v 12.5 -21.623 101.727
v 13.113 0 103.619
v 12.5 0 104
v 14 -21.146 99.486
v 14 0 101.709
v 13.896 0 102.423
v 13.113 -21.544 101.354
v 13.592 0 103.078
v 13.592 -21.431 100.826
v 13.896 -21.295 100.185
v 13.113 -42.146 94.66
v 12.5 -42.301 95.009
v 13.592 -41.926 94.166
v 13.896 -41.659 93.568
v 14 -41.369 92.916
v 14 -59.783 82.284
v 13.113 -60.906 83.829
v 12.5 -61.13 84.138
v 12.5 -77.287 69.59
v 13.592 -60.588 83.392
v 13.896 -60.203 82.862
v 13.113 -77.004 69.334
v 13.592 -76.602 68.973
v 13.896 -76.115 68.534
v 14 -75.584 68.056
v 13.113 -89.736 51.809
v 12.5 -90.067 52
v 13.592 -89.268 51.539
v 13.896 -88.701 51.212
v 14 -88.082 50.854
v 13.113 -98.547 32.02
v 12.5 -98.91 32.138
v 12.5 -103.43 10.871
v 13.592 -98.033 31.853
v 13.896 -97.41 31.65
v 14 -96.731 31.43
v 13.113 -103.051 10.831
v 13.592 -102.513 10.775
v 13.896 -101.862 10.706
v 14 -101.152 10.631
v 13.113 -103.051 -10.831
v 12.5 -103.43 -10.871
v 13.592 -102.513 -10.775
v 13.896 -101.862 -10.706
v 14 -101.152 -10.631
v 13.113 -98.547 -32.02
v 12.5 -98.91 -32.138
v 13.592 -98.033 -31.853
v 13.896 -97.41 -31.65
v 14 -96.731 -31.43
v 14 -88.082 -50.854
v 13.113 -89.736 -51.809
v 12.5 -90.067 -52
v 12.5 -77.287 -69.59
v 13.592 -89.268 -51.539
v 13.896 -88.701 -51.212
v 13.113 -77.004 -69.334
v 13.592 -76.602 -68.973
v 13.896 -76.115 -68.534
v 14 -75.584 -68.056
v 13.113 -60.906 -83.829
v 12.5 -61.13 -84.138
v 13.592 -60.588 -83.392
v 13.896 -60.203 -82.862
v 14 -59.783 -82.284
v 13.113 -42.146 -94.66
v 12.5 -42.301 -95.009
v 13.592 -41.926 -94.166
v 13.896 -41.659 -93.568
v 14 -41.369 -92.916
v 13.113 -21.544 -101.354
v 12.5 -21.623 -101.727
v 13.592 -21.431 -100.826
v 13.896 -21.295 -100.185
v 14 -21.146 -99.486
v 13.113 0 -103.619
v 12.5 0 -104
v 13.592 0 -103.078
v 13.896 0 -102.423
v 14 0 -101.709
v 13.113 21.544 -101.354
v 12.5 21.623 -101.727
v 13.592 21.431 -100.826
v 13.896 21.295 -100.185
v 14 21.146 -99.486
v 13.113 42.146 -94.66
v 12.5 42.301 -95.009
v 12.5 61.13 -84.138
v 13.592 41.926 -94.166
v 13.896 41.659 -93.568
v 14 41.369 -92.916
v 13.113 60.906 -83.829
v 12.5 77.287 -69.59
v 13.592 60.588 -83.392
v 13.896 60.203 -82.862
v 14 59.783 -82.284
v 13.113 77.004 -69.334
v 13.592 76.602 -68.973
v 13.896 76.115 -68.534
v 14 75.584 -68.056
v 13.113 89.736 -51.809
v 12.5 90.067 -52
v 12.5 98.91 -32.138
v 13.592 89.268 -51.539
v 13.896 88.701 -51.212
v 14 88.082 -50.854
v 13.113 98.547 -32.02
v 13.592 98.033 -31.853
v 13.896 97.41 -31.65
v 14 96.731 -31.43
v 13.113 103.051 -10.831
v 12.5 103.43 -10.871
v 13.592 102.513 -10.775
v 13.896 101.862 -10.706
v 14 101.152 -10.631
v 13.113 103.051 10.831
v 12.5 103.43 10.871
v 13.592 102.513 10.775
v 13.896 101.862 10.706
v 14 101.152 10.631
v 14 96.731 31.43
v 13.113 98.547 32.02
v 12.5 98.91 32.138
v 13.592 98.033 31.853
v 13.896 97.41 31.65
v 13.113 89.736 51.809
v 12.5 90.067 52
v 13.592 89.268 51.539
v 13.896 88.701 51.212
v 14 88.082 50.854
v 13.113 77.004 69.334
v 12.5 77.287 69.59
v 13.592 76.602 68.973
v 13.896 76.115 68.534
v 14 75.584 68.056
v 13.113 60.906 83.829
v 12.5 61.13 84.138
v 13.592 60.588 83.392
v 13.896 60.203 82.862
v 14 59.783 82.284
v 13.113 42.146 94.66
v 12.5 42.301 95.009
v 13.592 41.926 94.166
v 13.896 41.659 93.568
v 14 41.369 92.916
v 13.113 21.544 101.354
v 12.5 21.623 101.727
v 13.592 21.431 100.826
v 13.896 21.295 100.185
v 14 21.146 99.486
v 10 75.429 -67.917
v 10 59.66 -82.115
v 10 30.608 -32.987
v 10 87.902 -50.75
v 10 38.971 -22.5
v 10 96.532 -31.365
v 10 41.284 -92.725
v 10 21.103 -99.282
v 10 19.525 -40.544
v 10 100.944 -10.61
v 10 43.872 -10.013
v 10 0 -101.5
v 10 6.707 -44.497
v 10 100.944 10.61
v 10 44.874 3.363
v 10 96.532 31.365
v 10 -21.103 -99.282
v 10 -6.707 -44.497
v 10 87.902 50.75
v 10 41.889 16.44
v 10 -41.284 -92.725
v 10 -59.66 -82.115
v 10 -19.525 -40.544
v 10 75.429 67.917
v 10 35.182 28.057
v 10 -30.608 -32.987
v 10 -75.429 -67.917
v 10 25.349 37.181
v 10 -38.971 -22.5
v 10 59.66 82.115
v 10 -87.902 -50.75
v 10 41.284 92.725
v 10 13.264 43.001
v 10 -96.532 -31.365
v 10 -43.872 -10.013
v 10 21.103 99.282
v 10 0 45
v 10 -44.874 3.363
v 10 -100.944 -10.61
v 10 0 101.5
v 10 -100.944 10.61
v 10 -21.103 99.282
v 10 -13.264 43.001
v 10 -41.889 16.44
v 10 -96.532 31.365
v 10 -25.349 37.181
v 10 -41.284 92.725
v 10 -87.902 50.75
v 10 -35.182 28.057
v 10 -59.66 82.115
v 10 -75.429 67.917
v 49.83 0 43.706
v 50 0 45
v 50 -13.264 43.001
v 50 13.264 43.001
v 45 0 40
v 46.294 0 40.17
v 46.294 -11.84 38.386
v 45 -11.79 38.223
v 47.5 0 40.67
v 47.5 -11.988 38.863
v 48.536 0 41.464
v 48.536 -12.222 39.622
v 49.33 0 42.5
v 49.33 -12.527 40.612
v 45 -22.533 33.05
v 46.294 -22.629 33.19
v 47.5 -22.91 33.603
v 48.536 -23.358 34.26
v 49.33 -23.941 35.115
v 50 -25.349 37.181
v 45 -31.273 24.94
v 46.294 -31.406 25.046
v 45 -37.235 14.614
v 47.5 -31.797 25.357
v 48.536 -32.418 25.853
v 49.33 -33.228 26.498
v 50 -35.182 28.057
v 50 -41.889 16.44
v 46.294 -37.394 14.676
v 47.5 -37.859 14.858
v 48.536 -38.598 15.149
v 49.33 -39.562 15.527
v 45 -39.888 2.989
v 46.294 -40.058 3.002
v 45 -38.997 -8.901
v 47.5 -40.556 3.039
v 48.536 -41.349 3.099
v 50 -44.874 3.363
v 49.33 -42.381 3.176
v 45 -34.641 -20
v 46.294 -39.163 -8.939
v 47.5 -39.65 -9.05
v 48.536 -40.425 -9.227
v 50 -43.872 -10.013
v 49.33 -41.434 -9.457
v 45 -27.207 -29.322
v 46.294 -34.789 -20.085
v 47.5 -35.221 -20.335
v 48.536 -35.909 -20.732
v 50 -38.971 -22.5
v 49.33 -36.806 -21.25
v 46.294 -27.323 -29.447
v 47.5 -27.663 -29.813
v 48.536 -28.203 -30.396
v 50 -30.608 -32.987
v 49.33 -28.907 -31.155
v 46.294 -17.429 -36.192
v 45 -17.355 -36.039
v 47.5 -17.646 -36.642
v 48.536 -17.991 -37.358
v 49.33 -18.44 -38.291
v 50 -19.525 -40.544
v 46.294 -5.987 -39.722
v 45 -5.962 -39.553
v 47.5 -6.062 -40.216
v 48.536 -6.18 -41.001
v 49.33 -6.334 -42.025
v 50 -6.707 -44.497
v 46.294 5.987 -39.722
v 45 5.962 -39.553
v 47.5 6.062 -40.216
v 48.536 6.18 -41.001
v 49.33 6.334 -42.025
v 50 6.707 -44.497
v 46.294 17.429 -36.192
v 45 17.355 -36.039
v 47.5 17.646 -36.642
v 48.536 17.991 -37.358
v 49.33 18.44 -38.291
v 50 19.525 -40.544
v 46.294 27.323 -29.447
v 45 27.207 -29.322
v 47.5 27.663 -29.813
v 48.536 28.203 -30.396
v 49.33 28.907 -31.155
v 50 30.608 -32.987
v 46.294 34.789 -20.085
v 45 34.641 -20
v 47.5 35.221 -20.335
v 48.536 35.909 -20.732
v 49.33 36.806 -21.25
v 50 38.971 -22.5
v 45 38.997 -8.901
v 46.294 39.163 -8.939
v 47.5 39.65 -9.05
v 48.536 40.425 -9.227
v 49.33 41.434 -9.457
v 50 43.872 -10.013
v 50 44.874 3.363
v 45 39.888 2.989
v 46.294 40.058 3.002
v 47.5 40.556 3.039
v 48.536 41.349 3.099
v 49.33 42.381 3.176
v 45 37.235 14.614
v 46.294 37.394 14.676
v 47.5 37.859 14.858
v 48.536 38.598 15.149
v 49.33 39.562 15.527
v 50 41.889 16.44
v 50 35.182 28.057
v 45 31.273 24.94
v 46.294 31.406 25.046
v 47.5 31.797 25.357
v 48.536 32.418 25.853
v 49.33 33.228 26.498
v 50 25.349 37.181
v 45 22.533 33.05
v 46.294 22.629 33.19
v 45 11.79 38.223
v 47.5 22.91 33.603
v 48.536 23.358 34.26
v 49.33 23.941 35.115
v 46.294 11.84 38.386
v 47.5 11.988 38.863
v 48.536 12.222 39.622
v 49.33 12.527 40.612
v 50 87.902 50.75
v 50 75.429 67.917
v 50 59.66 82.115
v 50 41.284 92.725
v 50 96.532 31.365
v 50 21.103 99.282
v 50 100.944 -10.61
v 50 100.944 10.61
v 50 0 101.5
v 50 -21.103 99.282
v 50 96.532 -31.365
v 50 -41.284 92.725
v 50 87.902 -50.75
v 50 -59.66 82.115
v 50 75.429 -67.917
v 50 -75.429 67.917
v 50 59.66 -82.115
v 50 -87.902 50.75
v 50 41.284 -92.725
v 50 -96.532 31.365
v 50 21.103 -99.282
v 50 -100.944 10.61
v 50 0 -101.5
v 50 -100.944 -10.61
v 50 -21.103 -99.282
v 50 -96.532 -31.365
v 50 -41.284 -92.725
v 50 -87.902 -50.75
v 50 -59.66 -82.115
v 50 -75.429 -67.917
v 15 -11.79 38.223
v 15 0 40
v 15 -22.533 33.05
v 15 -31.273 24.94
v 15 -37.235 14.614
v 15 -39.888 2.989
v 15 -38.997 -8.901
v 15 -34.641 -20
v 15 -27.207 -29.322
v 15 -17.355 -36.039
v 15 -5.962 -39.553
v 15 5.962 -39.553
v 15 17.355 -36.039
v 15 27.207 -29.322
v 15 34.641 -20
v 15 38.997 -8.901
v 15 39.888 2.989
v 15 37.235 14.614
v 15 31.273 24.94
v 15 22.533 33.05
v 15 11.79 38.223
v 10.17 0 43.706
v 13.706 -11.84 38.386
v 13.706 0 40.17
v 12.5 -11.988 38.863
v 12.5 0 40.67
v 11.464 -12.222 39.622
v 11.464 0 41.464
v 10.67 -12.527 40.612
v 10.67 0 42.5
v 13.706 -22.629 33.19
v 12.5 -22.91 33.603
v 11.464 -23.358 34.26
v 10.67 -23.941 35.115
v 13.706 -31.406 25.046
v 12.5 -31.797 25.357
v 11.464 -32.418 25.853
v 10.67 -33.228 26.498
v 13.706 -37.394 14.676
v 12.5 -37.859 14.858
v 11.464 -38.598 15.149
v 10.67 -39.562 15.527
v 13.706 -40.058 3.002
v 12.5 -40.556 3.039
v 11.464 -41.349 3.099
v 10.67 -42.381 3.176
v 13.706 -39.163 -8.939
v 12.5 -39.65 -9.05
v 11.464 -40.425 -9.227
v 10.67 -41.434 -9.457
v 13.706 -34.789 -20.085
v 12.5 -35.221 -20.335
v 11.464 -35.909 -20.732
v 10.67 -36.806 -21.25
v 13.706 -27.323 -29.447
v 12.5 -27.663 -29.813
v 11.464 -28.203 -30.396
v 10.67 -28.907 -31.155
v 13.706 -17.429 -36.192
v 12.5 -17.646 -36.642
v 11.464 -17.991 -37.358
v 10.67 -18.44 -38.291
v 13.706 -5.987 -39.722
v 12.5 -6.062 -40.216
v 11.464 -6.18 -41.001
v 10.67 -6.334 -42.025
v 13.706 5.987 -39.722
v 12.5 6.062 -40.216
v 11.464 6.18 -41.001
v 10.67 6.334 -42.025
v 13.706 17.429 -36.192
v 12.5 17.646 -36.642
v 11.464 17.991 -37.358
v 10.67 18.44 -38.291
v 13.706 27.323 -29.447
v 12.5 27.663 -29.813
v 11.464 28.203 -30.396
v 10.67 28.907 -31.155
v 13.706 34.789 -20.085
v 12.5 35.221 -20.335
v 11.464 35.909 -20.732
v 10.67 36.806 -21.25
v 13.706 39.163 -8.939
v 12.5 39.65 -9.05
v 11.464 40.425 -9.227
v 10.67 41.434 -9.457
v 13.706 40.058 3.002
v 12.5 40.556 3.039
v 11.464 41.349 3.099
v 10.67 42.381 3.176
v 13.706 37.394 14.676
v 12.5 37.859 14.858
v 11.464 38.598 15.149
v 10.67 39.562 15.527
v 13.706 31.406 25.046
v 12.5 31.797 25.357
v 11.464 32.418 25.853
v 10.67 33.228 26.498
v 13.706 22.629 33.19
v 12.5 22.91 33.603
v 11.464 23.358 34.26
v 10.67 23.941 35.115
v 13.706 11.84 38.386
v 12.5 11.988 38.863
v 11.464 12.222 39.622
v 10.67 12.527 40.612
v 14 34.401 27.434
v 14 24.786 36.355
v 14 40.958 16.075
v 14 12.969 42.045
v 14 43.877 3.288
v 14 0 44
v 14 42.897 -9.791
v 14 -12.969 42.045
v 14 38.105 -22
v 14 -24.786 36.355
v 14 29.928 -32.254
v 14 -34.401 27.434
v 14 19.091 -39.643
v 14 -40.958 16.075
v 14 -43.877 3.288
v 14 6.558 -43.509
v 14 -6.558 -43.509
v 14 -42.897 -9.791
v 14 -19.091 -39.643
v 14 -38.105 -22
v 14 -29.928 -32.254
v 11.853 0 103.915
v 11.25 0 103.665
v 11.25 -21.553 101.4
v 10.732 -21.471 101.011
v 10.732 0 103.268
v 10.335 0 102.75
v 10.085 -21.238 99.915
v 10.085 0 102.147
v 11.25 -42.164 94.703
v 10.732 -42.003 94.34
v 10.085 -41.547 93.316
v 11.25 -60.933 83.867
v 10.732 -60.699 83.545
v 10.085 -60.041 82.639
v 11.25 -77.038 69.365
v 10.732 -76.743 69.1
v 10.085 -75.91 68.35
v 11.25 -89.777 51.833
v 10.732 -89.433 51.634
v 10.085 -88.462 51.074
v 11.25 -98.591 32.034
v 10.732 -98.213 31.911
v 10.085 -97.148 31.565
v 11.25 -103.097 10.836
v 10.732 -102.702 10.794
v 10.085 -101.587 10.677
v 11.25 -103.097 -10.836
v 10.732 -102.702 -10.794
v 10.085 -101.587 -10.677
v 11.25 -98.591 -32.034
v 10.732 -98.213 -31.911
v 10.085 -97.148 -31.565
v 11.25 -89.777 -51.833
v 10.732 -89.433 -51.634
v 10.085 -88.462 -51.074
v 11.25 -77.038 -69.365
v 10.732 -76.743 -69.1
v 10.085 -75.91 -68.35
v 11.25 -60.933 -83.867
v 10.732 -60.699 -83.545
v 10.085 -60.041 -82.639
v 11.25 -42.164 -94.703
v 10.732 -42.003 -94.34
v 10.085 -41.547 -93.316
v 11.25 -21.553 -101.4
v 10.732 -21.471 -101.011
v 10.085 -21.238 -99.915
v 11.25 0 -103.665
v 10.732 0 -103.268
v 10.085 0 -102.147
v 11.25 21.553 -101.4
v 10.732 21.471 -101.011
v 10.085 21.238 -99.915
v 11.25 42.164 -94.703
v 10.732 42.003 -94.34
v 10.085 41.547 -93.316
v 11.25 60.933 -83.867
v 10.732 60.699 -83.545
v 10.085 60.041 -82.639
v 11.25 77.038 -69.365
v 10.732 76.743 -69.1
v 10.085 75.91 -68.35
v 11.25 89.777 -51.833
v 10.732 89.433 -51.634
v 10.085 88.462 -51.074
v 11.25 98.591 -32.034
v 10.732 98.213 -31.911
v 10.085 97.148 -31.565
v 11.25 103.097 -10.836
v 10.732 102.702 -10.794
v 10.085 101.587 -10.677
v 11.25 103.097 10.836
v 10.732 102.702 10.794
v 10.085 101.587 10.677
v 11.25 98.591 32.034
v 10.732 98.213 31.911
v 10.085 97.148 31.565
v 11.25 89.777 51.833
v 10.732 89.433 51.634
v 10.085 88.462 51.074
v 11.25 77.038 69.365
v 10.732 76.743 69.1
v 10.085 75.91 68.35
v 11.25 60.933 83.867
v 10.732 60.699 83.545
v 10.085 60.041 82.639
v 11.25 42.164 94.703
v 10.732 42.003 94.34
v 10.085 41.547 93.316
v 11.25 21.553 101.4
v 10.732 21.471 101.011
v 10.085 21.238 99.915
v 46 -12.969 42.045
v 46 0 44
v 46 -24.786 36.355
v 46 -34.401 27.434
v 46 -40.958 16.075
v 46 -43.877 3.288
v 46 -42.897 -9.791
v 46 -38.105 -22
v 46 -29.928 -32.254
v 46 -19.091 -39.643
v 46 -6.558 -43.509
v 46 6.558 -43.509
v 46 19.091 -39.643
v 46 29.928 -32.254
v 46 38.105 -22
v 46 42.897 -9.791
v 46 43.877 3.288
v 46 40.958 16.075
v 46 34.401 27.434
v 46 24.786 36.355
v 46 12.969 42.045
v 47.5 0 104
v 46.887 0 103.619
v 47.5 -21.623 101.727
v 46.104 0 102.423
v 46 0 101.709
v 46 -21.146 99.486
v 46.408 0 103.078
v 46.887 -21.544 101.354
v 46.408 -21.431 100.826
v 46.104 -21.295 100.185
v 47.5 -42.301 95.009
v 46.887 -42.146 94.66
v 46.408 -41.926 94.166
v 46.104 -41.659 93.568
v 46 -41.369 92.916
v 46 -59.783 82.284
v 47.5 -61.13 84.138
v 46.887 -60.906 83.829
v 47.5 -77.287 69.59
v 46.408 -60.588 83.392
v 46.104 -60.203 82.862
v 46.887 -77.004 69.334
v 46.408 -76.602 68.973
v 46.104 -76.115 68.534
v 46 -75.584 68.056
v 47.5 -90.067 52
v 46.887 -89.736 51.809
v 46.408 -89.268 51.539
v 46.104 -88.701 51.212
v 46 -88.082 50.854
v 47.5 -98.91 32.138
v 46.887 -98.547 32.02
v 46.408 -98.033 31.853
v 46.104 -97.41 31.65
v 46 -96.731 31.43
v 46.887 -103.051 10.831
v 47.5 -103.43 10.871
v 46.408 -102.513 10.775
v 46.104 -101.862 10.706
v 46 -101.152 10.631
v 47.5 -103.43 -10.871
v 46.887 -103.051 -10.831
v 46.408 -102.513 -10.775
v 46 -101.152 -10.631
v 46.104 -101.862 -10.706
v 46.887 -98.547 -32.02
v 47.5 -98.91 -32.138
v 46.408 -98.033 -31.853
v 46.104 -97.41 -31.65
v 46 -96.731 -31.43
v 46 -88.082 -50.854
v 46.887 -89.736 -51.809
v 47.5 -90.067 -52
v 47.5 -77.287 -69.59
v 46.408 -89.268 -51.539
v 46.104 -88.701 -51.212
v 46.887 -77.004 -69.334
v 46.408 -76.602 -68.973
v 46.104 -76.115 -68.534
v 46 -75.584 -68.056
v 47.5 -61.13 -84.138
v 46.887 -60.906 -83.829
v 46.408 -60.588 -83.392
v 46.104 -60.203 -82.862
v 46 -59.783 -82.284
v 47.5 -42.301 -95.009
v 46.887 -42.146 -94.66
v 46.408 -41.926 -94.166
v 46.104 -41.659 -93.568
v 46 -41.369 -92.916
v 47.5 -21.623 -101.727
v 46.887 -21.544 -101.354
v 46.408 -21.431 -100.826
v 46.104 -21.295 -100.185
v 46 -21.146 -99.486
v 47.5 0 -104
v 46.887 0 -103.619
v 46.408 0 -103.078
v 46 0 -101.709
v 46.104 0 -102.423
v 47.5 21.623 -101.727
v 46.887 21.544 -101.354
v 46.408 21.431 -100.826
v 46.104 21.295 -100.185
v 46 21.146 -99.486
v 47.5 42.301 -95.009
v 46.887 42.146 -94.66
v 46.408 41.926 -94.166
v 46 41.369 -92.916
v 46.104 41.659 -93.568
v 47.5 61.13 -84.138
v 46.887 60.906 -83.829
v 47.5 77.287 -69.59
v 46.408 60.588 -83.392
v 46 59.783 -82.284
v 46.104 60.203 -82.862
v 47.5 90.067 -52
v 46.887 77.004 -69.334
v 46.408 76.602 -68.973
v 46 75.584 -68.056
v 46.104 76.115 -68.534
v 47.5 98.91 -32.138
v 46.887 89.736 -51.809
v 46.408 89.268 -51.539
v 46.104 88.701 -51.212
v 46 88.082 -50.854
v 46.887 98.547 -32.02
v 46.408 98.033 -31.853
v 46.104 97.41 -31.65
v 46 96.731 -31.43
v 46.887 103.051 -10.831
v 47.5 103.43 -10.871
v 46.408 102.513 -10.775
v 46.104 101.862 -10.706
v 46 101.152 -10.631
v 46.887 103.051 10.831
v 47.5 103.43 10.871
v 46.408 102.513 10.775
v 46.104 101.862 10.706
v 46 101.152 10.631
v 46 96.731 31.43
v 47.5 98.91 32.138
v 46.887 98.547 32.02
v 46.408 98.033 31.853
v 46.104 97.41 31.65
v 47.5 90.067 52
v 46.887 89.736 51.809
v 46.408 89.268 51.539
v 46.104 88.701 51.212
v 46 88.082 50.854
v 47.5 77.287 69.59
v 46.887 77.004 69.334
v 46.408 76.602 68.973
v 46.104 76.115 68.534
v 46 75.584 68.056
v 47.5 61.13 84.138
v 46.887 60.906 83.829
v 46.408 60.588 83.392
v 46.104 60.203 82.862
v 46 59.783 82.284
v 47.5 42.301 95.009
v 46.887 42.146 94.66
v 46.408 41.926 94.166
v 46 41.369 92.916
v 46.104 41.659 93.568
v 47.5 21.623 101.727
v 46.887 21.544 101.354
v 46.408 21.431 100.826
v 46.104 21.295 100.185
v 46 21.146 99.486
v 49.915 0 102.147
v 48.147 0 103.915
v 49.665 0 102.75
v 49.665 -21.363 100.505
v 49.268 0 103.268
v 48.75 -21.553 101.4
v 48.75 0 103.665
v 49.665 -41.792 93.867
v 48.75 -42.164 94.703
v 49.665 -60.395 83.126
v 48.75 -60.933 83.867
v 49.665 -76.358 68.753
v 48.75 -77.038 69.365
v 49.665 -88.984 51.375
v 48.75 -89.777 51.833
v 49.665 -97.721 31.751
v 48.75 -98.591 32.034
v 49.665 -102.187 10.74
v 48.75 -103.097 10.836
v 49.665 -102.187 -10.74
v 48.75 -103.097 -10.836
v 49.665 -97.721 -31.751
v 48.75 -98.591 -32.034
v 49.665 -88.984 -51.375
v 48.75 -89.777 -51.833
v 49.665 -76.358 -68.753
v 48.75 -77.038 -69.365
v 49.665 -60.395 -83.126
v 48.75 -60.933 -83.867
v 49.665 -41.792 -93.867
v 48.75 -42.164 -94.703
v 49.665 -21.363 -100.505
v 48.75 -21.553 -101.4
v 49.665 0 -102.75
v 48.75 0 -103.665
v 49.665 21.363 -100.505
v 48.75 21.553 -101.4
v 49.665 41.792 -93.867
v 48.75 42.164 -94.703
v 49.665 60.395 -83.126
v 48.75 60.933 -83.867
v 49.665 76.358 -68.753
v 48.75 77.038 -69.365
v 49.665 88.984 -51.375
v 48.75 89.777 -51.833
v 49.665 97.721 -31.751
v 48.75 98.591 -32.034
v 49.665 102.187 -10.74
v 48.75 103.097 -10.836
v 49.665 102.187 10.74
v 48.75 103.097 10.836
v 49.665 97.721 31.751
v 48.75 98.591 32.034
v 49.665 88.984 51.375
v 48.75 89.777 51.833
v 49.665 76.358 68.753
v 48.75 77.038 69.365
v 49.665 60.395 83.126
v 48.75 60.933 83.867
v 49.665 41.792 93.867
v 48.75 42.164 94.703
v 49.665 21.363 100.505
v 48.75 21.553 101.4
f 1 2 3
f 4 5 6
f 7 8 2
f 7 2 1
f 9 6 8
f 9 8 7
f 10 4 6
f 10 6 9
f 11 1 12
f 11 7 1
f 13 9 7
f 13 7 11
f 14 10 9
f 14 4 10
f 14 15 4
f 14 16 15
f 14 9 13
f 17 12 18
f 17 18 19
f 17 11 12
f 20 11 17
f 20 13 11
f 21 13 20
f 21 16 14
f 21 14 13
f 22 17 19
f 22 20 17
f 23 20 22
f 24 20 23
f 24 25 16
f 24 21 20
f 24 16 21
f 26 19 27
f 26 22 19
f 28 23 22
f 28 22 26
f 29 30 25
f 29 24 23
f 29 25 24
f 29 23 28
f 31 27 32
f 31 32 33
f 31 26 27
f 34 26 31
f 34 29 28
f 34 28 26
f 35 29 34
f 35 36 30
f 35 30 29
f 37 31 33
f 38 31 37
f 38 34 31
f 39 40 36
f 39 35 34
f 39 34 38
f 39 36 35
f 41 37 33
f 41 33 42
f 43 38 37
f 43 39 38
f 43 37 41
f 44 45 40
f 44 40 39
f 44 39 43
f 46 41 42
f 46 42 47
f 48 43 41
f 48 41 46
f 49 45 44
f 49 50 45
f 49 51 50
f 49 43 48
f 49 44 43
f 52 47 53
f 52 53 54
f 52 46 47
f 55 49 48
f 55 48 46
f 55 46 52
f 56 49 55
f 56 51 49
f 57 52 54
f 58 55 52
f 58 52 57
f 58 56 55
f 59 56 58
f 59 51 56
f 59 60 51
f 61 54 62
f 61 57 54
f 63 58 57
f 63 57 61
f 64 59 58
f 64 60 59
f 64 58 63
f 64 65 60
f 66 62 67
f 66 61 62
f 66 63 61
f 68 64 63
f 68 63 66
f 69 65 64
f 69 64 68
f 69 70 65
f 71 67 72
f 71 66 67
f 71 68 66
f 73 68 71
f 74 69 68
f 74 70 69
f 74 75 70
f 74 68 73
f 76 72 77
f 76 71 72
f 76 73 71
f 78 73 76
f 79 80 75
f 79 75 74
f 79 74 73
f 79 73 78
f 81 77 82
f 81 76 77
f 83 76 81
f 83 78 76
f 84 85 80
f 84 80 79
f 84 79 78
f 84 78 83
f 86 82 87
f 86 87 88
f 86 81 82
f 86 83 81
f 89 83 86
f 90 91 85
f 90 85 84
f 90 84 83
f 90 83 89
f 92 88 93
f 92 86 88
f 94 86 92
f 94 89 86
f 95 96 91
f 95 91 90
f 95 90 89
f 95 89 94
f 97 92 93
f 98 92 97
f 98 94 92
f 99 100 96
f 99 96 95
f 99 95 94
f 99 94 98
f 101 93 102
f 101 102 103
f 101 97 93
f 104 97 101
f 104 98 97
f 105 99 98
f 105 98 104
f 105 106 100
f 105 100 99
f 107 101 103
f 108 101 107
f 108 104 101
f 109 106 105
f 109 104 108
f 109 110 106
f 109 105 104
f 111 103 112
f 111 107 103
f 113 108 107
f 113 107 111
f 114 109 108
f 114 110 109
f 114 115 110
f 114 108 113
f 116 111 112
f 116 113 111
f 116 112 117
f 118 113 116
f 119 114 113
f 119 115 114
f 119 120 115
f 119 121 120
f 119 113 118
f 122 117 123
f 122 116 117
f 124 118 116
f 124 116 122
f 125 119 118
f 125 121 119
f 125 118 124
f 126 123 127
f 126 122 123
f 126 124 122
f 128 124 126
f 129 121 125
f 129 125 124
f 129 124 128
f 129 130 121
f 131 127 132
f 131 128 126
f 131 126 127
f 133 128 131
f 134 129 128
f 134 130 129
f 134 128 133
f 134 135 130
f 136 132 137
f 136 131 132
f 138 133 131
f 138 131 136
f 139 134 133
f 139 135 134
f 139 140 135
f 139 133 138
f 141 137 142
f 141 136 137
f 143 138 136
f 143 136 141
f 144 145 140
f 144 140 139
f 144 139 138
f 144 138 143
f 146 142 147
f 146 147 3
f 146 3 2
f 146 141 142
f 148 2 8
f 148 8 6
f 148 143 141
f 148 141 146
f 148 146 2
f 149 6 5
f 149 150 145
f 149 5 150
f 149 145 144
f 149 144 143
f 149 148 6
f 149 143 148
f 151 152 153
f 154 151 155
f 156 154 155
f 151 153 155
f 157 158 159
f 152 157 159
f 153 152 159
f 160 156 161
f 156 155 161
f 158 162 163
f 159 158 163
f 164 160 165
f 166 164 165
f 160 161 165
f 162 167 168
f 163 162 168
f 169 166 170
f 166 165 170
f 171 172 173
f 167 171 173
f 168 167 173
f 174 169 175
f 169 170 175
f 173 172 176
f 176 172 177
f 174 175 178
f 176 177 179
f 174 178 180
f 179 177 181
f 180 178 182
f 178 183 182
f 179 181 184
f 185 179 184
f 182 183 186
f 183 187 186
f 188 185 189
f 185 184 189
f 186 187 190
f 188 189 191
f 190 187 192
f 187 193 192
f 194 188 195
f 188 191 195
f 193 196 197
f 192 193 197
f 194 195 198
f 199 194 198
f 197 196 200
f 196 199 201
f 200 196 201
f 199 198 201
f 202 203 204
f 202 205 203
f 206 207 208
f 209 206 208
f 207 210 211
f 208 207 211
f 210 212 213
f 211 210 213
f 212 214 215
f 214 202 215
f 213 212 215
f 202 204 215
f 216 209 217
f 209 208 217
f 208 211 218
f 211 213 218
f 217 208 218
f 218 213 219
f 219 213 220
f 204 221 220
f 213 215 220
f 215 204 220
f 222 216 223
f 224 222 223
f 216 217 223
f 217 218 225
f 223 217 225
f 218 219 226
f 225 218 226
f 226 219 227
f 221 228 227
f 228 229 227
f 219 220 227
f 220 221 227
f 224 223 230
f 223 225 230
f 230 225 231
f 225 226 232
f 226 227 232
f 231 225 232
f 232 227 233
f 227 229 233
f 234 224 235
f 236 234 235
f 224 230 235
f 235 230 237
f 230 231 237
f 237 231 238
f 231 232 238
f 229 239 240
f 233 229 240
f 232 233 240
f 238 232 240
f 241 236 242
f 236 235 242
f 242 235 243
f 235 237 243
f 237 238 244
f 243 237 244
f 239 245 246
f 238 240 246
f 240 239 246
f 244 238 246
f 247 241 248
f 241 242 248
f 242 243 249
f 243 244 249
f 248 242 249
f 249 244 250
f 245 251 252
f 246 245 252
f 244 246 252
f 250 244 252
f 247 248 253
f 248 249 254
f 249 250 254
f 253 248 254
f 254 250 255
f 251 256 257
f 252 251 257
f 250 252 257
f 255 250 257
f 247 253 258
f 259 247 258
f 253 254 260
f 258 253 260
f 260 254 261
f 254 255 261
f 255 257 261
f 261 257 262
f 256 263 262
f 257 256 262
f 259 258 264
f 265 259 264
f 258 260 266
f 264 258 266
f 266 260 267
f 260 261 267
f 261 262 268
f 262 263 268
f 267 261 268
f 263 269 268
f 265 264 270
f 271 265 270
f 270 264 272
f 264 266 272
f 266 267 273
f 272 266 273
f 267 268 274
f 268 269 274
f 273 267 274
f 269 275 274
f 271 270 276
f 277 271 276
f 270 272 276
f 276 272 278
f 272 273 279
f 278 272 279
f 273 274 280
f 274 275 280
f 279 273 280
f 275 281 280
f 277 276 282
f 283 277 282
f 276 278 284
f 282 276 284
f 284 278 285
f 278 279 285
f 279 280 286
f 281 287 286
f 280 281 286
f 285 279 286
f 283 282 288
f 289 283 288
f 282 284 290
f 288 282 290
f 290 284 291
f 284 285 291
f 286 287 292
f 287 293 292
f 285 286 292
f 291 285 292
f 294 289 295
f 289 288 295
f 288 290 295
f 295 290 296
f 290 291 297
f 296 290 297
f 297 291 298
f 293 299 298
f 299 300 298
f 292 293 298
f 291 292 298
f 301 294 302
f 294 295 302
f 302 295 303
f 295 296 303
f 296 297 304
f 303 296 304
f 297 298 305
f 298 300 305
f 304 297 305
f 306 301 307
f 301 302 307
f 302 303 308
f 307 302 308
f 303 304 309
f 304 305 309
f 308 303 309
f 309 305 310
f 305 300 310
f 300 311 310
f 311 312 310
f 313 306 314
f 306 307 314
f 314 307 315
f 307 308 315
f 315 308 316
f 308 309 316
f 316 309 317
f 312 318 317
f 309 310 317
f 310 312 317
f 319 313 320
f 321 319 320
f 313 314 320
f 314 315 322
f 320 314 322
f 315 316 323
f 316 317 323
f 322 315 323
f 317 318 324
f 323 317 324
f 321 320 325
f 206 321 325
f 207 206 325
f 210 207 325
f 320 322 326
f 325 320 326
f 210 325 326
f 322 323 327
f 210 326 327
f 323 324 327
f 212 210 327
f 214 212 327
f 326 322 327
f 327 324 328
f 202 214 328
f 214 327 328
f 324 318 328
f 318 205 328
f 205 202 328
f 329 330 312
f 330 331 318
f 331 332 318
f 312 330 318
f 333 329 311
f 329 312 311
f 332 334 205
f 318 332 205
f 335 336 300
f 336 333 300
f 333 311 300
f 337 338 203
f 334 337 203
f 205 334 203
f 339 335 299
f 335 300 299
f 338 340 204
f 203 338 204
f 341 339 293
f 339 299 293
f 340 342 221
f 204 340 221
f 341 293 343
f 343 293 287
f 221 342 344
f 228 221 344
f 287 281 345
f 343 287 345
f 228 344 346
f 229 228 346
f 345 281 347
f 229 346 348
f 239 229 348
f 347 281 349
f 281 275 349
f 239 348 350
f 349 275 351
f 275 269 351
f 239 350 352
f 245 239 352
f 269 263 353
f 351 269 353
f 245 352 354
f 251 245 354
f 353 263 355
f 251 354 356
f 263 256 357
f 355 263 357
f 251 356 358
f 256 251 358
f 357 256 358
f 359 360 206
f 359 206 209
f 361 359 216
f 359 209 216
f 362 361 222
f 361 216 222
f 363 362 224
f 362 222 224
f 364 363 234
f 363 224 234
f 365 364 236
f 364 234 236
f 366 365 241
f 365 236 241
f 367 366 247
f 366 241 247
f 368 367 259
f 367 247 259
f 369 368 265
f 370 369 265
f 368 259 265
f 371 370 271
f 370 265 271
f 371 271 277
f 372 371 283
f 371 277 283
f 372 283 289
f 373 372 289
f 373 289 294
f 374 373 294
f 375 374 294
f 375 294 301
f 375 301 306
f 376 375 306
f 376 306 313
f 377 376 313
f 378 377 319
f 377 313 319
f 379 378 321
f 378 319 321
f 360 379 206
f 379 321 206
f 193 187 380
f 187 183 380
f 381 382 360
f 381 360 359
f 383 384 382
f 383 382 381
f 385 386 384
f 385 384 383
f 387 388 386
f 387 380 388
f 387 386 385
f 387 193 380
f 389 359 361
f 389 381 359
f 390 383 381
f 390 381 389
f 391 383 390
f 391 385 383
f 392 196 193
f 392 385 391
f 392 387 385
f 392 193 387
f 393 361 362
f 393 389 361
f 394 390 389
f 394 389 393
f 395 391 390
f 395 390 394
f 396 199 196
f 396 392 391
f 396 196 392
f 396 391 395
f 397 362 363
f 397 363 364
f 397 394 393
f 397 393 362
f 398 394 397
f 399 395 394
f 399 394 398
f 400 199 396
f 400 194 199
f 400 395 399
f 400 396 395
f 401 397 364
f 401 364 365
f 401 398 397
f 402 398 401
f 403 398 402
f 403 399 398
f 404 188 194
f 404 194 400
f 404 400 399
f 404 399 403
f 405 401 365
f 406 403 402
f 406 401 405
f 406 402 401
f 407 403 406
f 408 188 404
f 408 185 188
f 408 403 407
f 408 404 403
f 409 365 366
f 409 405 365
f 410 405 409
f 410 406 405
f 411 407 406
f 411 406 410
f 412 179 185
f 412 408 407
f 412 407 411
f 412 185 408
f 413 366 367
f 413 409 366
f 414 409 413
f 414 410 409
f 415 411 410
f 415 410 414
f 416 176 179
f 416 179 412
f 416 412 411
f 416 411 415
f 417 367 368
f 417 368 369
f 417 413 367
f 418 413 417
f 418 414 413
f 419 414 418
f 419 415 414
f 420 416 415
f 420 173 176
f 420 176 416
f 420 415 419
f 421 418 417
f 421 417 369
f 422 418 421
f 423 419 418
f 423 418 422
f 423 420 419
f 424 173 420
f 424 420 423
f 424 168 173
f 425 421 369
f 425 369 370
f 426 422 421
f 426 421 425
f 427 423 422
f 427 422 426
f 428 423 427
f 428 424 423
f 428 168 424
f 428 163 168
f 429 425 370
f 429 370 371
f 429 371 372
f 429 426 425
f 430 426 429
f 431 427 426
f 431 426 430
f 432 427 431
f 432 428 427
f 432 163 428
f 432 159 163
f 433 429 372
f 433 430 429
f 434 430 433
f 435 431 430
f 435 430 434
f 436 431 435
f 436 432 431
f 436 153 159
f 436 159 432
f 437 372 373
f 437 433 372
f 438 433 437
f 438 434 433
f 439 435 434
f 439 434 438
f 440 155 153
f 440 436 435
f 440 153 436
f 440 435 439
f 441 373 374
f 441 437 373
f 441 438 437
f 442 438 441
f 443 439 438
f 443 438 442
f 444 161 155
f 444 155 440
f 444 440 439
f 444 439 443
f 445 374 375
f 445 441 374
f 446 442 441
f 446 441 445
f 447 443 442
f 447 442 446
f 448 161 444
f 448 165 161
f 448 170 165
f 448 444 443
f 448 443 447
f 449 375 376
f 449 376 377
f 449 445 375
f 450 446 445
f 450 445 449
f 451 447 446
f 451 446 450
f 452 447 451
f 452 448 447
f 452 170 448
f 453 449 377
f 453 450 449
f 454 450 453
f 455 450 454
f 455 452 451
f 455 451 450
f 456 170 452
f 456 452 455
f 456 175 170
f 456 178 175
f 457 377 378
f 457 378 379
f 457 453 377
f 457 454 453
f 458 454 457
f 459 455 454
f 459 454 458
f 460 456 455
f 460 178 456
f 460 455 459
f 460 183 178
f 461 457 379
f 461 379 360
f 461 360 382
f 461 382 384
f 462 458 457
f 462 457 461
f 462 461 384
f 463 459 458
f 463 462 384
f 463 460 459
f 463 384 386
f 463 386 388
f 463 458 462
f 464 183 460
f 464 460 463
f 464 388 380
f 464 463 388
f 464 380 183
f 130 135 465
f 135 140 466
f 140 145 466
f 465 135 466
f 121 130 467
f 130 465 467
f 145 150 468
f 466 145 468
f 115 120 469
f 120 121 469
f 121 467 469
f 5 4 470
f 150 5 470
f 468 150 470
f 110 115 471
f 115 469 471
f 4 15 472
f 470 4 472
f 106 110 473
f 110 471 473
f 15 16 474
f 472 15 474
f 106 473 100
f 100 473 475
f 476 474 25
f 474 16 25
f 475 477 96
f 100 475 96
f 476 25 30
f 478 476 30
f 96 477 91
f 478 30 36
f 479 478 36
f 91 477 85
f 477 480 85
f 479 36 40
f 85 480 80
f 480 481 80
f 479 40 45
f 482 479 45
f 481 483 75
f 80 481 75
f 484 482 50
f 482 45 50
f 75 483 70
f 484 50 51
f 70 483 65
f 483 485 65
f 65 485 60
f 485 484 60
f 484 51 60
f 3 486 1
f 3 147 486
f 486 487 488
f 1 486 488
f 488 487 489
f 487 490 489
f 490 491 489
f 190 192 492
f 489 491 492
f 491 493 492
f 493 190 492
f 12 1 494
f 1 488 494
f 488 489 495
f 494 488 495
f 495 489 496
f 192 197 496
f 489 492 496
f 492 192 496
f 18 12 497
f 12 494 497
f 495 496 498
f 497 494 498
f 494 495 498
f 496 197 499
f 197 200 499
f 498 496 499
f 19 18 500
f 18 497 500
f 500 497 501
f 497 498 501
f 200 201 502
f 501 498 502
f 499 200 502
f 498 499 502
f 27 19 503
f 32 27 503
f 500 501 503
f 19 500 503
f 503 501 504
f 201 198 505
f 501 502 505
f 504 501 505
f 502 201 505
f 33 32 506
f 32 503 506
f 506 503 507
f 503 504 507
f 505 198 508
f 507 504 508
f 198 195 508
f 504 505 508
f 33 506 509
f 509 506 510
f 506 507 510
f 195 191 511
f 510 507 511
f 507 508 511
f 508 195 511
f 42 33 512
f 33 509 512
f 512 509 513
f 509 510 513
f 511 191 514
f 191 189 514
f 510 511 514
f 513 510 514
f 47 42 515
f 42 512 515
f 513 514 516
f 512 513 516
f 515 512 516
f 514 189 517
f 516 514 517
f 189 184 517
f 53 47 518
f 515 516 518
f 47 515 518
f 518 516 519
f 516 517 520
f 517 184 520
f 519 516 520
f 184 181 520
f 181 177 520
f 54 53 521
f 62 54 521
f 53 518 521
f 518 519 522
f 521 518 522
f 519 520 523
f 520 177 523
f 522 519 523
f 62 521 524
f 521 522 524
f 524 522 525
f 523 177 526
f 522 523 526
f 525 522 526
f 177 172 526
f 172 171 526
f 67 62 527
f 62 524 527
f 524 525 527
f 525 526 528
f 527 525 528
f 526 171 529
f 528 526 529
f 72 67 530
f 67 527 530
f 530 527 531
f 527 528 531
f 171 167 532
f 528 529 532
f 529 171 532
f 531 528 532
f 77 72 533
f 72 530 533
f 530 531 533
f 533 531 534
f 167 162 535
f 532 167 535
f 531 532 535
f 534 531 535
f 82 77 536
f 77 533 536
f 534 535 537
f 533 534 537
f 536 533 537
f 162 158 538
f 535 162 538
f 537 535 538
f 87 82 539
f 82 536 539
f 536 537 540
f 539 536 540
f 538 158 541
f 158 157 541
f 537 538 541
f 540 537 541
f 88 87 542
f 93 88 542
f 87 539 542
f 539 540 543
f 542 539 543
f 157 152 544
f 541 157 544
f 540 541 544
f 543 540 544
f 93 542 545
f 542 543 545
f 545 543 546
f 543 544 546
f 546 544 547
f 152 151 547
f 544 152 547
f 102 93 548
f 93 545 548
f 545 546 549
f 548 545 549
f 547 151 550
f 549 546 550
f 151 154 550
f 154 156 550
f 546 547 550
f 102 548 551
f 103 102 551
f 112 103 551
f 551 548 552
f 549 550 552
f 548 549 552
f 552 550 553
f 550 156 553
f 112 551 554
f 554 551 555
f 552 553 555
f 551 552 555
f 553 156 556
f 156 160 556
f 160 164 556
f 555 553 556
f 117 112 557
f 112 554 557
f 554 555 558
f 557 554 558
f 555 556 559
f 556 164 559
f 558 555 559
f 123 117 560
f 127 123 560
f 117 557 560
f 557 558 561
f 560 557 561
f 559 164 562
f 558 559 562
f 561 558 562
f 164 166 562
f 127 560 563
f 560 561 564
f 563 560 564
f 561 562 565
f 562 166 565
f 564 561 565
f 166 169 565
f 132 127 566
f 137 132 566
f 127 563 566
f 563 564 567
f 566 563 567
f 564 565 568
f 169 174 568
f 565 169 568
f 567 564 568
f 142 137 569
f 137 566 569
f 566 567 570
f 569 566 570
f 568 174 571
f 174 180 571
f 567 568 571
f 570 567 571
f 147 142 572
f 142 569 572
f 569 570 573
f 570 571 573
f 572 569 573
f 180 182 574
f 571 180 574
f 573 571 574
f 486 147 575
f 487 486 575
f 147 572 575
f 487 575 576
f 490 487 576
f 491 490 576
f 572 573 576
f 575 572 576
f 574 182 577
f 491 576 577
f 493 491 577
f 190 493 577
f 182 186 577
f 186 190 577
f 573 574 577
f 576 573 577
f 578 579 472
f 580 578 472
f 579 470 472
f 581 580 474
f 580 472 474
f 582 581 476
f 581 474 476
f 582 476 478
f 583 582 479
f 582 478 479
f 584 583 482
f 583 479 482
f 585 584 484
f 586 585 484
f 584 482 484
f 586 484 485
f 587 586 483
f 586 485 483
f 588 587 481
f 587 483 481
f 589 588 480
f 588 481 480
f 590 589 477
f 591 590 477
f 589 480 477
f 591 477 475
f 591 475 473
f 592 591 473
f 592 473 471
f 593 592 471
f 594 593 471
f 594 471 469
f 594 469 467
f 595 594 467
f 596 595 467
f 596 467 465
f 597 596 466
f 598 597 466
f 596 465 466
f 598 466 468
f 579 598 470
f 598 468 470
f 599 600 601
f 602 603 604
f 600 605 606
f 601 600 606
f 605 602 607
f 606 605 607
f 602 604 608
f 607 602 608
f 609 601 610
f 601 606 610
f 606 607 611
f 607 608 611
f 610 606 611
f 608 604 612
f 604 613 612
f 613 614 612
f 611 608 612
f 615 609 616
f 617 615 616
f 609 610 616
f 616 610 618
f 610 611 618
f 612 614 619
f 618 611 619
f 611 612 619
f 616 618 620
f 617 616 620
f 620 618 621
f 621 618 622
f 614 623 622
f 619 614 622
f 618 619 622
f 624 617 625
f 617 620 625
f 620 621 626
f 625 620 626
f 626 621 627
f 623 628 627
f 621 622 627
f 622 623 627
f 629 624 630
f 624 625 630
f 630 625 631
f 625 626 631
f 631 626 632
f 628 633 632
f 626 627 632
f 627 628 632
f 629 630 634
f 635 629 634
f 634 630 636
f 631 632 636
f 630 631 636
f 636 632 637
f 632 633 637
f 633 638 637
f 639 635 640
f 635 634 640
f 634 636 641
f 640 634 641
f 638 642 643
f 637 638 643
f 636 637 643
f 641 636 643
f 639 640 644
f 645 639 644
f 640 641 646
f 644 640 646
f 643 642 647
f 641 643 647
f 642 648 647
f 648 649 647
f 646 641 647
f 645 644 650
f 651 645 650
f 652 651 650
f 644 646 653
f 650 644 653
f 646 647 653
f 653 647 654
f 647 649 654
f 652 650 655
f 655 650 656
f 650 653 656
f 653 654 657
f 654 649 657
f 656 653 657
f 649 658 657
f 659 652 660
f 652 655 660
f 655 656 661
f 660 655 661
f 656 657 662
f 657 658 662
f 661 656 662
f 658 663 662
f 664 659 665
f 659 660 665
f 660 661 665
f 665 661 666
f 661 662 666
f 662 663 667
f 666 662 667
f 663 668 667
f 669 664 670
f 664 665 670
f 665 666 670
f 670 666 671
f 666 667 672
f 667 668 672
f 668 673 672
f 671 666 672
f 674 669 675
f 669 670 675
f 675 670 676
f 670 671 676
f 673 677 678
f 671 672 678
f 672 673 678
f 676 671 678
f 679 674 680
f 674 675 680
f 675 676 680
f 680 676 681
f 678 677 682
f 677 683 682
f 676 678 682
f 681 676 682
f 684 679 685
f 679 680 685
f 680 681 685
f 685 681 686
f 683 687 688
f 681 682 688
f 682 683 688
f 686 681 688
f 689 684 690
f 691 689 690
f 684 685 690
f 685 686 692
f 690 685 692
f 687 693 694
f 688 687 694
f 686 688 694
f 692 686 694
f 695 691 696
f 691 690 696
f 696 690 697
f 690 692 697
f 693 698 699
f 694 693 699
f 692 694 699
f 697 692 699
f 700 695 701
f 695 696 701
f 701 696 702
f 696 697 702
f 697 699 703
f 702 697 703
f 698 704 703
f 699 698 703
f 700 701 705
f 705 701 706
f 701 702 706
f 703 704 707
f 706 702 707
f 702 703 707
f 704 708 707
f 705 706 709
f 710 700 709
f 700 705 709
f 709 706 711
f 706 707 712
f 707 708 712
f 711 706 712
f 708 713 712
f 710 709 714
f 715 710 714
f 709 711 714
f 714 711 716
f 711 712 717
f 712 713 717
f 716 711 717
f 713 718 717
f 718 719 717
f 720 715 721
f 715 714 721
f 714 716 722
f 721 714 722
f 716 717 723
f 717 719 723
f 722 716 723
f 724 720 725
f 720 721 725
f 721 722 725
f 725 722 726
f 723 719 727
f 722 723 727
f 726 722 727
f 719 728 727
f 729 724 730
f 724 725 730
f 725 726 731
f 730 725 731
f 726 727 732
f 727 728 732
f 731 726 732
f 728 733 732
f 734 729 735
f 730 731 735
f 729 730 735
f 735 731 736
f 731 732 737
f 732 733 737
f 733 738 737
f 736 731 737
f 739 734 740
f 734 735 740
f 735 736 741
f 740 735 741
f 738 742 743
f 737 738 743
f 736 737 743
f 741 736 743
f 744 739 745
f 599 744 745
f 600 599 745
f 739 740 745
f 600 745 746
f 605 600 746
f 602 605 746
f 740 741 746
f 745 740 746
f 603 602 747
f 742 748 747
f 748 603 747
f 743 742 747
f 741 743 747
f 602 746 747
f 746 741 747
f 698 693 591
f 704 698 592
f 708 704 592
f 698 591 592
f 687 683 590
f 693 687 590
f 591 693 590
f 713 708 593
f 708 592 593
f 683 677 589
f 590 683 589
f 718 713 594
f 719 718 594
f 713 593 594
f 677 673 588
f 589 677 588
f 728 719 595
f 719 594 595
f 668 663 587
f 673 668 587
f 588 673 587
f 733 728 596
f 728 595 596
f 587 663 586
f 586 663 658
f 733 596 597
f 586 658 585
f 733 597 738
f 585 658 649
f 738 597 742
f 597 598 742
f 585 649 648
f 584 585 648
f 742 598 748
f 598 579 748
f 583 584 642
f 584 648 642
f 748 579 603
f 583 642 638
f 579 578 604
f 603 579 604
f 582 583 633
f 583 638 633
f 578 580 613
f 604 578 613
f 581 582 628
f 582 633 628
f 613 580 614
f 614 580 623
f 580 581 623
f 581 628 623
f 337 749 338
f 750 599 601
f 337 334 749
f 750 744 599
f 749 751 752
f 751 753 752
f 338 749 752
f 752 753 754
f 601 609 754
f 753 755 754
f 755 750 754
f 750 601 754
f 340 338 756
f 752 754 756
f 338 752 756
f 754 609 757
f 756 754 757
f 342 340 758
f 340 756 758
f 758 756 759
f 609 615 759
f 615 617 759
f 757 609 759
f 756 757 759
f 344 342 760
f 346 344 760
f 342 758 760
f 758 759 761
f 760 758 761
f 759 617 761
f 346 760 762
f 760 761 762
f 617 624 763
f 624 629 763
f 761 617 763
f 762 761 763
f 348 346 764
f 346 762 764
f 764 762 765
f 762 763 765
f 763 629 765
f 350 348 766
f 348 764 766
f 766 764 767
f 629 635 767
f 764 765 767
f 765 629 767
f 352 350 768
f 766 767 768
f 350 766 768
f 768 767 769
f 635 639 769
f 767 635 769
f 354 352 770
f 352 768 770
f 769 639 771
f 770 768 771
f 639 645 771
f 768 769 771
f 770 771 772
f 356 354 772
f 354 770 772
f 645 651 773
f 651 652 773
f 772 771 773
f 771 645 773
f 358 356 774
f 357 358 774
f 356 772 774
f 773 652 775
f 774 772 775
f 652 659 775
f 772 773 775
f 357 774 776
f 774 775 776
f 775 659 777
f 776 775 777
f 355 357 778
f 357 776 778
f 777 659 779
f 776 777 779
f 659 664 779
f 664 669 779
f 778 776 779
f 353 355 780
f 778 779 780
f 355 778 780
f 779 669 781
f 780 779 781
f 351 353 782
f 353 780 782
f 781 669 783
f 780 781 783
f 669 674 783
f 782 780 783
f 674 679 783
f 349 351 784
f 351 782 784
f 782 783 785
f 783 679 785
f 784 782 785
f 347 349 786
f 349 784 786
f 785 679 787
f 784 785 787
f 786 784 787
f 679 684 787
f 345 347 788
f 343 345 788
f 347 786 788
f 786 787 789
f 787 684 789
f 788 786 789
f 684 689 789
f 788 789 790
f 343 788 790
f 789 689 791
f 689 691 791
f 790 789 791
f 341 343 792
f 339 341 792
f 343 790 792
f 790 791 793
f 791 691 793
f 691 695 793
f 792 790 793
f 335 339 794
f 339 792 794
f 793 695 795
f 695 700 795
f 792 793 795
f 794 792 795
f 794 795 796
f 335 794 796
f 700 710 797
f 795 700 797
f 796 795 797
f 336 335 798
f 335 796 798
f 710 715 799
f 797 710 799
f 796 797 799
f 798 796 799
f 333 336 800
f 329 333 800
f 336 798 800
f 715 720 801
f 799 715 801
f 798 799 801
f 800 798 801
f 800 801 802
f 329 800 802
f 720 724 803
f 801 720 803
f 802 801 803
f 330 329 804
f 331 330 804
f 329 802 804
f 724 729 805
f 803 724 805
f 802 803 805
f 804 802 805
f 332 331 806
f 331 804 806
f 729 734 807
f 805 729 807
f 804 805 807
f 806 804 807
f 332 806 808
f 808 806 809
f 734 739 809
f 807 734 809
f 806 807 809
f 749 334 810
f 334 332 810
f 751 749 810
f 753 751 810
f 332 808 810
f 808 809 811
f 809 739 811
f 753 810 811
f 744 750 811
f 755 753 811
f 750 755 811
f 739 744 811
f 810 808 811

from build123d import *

# Parameters (mm, degrees)
F2_R = 2.5
F4_R = 5
F5_R = 5


# Not quite as in the source:
# - a fillet or chamfer that OpenCascade refuses, or shapes differently, is made with other operations: its cross-section is extruded or revolved along the edge and cut away or added


with BuildPart() as f1:
    # F0 (on Front) → F1 (revolve)
    with BuildSketch(Plane.XZ):
        Polygon((10, 44), (10, 40), (50, 40), (50, 44), (50, 104), (46, 104), (46, 44), (14, 44), (14, 104), (10, 104), align=None)
    revolve(axis=Axis((30, 0, 0), (1, 0, 0)))

    # F2
    f2_edges = [f1.edges().sort_by_distance(p)[0] for p in [
        (10, 0, -104),
        (50, 0, -104),
    ]]
    fillet(f2_edges, radius=F2_R)

    # F3: fillet of radius 2.5 on 2 edges, made by hand

    # F3_s1 → F3_t2 (revolve, cut)
    with BuildSketch(Plane.XZ):
        with BuildLine():
            ThreePointArc((12.5, 104), (13.5916500663, 103.0780185463), (14, 101.7087121525))
            Line((14, 101.7087121525), (14, 104))
            Line((14, 104), (12.5, 104))
        make_face()
    revolve(axis=Axis((14, 0, 0), (1, 0, 0)), mode=Mode.SUBTRACT)

    # F3_s3 → F3_t4 (revolve, cut)
    with BuildSketch(Plane.XZ):
        with BuildLine():
            ThreePointArc((47.5, 104), (46.4083499337, 103.0780185463), (46, 101.7087121525))
            Line((46, 101.7087121525), (46, 104))
            Line((46, 104), (47.5, 104))
        make_face()
    revolve(axis=Axis((46, 0, 0), (1, 0, 0)), mode=Mode.SUBTRACT)

    # F4
    f4_edges = [f1.edges().sort_by_distance(p)[0] for p in [
        (10, 0, -40),
    ]]
    fillet(f4_edges, radius=F4_R)

    # F5
    f5_edges = [f1.edges().sort_by_distance(p)[0] for p in [
        (50, 0, -40),
    ]]
    fillet(f5_edges, radius=F5_R)


solid = f1.part
